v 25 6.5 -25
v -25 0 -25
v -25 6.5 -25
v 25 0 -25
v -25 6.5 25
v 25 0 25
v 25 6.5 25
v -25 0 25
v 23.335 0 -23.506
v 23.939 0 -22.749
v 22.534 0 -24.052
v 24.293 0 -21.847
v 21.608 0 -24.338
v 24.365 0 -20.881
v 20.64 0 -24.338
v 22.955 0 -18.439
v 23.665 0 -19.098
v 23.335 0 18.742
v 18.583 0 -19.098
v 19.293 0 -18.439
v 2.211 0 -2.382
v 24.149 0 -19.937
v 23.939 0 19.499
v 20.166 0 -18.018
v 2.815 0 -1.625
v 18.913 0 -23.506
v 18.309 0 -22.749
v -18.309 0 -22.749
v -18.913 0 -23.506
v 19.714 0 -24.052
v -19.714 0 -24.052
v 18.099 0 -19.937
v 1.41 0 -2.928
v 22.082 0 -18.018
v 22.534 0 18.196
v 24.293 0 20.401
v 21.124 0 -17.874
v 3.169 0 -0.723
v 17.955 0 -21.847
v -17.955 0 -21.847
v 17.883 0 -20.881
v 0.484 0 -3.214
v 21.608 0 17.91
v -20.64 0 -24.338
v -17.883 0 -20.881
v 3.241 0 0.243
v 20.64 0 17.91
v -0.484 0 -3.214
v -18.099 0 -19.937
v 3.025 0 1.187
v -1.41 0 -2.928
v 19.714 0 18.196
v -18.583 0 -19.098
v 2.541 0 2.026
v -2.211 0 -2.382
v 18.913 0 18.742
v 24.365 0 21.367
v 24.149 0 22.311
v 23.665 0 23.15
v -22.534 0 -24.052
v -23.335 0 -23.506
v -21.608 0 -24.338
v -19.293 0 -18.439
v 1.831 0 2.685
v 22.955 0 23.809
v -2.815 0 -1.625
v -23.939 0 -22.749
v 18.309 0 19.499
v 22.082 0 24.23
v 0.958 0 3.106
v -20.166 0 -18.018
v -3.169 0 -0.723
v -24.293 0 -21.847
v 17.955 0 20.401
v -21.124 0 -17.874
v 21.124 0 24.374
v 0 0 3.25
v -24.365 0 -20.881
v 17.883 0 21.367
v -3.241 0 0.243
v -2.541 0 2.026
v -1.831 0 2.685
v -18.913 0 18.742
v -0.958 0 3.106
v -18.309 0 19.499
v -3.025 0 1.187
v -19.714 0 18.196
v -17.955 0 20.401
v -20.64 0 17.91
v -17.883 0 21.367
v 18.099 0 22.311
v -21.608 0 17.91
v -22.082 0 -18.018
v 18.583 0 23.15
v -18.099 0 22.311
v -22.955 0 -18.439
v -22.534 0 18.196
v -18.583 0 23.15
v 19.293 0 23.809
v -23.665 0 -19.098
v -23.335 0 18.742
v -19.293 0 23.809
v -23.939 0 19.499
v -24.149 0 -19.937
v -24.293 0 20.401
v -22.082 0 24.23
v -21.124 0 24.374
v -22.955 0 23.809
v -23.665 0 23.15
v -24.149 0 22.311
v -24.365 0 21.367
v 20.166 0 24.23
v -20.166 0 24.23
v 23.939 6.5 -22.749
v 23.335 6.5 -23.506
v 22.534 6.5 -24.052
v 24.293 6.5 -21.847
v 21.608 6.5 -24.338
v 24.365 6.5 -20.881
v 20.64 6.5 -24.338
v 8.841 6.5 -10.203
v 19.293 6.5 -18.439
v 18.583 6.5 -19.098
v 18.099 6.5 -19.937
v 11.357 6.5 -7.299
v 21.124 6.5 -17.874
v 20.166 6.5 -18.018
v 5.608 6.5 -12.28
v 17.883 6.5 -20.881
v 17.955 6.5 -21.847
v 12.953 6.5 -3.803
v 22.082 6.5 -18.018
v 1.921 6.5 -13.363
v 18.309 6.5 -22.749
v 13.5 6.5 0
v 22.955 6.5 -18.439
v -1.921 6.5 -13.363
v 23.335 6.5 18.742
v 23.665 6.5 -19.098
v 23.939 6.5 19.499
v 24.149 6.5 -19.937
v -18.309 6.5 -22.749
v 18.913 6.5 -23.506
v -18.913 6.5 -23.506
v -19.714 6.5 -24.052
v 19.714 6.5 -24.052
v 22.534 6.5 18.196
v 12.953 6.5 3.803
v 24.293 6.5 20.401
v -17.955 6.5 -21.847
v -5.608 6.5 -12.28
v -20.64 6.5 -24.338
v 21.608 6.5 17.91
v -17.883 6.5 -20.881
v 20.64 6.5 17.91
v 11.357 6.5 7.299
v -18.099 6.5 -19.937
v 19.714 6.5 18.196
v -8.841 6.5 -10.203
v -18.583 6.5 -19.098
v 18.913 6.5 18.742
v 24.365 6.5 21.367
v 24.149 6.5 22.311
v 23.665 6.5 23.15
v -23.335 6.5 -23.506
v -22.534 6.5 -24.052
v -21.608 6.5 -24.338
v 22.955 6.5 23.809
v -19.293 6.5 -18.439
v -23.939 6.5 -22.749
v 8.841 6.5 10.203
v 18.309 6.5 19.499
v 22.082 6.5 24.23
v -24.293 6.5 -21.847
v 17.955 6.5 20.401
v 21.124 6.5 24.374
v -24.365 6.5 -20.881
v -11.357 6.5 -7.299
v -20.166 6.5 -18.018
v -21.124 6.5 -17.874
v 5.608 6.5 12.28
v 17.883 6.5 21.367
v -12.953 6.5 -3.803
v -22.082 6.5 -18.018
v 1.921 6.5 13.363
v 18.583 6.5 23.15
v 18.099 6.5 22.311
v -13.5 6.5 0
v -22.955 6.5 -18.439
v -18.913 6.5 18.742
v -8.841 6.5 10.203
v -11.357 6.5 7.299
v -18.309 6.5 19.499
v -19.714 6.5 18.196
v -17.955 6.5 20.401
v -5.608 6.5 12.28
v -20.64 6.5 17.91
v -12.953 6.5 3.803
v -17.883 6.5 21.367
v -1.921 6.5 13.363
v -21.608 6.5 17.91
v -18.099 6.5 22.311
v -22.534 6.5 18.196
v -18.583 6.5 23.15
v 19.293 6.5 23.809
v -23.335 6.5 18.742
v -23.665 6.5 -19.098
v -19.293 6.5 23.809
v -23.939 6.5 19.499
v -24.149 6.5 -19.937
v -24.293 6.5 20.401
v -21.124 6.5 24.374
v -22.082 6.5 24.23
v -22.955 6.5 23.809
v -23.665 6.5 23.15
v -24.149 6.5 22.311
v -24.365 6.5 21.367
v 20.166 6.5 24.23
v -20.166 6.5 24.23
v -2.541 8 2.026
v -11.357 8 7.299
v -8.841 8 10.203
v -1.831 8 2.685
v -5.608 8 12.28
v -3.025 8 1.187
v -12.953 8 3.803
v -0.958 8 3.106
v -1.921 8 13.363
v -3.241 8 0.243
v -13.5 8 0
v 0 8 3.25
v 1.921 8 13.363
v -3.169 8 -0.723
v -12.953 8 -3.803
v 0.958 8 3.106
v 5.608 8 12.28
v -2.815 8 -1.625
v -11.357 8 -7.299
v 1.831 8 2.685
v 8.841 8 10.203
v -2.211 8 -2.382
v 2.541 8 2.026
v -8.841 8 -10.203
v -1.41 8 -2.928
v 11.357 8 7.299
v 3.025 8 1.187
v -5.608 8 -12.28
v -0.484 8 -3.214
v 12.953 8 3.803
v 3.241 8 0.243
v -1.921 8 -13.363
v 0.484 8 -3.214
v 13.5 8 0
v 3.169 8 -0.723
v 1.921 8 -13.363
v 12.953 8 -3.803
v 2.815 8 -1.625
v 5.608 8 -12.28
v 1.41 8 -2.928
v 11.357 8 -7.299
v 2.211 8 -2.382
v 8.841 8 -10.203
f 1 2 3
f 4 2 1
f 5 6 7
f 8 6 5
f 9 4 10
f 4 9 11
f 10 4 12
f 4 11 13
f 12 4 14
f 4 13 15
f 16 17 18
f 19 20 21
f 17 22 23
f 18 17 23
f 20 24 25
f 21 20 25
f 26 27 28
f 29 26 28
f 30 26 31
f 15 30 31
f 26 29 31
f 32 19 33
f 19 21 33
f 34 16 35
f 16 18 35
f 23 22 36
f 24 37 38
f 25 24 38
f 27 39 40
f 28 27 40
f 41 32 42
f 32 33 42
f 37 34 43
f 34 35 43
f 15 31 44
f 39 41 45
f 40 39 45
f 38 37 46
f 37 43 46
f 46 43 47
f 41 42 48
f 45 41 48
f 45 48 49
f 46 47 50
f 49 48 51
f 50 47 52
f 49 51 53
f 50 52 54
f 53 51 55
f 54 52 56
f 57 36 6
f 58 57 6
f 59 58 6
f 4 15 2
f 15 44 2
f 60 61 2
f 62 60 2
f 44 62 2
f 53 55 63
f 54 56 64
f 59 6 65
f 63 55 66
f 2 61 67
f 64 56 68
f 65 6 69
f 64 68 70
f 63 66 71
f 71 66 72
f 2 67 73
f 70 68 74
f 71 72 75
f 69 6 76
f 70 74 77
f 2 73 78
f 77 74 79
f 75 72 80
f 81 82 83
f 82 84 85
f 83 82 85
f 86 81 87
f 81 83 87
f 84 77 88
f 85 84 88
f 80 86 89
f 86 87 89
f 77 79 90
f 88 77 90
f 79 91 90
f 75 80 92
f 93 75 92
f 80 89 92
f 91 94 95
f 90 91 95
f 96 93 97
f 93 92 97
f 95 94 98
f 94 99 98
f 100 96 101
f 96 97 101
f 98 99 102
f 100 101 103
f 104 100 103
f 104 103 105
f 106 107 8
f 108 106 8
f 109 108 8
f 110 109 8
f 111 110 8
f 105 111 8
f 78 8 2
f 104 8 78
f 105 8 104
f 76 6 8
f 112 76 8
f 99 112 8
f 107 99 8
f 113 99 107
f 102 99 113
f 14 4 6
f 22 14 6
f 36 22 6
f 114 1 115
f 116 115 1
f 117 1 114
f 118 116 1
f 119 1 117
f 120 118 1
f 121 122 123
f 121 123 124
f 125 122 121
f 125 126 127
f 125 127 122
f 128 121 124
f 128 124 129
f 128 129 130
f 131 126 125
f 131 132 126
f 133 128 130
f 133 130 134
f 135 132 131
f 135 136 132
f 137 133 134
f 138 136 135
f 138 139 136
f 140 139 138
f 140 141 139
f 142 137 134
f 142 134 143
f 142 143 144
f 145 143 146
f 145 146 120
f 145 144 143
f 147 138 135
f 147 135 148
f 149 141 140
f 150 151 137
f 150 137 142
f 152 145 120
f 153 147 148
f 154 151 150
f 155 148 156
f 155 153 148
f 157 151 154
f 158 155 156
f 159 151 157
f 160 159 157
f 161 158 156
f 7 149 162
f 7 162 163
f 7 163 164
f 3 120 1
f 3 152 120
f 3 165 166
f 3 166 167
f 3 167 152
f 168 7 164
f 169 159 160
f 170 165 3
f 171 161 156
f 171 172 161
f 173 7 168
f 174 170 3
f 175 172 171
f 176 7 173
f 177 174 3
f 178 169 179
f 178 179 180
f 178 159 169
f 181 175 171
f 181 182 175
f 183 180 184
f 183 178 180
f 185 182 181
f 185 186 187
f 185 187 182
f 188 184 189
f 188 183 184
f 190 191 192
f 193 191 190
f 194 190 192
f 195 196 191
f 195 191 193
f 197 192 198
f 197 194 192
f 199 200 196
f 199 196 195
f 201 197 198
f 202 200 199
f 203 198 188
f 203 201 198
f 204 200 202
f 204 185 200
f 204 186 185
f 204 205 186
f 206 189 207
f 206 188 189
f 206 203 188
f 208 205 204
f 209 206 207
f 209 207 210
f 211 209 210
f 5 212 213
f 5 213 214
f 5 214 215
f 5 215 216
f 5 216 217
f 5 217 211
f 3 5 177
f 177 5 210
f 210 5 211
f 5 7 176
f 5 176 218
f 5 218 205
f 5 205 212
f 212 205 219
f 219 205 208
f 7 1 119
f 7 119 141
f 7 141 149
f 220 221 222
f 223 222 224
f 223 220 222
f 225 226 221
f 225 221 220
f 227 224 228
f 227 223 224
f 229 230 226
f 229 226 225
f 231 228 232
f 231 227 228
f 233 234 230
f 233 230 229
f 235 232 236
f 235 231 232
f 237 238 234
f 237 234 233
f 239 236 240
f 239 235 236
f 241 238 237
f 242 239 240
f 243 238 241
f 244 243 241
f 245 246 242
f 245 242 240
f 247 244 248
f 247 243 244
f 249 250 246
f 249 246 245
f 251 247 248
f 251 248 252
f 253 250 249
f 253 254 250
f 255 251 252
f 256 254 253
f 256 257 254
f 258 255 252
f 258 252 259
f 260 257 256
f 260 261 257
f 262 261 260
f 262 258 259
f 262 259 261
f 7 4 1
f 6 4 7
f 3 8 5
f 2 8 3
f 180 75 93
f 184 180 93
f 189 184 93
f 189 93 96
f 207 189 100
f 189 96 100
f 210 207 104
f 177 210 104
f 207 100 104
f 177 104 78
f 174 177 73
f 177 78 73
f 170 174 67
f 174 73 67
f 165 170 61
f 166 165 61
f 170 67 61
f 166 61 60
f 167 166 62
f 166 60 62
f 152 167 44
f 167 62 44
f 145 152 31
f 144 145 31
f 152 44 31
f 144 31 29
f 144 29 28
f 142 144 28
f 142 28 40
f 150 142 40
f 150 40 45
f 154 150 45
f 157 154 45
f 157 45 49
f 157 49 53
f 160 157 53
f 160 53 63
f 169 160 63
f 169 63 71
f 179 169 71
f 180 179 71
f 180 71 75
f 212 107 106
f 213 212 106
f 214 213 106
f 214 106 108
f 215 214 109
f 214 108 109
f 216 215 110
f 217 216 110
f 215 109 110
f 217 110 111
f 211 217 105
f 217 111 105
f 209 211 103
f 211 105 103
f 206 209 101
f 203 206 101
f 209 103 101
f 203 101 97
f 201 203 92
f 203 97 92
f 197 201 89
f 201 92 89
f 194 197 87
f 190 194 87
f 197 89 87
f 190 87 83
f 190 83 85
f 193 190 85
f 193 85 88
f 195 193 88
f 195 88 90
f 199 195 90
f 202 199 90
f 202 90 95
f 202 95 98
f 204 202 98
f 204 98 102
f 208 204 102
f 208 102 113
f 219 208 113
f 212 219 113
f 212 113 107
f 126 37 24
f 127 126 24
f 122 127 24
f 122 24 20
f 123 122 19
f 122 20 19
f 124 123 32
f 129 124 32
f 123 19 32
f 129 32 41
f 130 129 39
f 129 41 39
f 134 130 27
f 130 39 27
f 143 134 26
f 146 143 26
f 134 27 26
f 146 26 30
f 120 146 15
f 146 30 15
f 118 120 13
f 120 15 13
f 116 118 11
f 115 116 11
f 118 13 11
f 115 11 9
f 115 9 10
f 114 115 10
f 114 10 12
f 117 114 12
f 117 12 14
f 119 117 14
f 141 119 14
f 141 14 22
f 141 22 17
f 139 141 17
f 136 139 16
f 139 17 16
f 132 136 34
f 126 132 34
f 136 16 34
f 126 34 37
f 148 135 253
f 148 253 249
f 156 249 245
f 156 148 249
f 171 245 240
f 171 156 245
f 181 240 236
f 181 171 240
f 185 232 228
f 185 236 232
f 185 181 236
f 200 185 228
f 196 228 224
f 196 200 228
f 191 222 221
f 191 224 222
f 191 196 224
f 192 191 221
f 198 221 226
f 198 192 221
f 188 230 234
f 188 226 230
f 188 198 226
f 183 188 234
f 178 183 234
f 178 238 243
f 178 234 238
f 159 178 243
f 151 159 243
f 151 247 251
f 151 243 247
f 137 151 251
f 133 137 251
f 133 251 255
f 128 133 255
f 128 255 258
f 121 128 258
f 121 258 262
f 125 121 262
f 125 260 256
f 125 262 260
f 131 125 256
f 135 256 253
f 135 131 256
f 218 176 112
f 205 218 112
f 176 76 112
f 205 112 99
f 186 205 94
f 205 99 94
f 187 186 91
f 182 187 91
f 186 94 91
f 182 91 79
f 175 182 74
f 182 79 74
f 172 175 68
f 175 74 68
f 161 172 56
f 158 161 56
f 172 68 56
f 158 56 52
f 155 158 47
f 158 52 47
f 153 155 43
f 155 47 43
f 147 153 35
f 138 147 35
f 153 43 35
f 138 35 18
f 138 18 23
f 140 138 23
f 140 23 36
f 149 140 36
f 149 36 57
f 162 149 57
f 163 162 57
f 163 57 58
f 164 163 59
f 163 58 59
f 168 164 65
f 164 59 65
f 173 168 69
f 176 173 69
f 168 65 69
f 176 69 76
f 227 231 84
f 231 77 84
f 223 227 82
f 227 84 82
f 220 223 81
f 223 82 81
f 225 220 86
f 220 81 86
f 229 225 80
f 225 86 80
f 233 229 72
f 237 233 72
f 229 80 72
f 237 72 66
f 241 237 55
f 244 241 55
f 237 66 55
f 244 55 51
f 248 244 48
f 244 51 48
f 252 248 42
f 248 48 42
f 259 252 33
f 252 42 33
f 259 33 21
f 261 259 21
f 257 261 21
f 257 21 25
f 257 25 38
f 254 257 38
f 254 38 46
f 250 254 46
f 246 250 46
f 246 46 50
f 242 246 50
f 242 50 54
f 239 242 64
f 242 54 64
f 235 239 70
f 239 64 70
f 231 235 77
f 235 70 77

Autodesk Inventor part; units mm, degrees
ref_plane "YZ Plane" through (0, 0, 0) normal (1, 0, 0) x (0, 1, 0)
ref_plane "XZ Plane" through (0, 0, 0) normal (0, 1, 0) x (-1, 0, 0)
ref_plane "XY Plane" through (0, 0, 0) normal (0, 0, 1) x (1, 0, 0)
sketch "Skizze1" plane through (0, 0, 0) normal (0, 1, 0) x (-1, 0, 0)
  line L0 (-25, 25) -> (25, 25)
  line L1 (25, 25) -> (25, -25)
  line L2 (25, -25) -> (-25, -25)
  line L3 (-25, -25) -> (-25, 25)
  line L4 (-25, 25) -> (25, -25) construction
  line L5 (25, 25) -> (-25, -25) construction
  point P0 (0, 0)
  dimension "d0" = 50
  dimension "d1" = 50
extrude "Extrusion1" add sketch "Skizze1" along normal blind 6.5
sketch "Skizze2" plane through (0, 6.5, 0) normal (0, 1, 0) x (1, 0, 0)
  circle A0 centre (0, 0) radius 13.5
  dimension "d4" = 27
extrude "Extrusion2" add sketch "Skizze2" along normal blind 1.5
sketch "Skizze3" plane through (0, 8, 0) normal (0, 1, 0) x (1, 0, 0)
  circle A0 centre (0, 0) radius 13.5 projected
hole "Bohrung1" at (0, 8, 0) direction (0, -1, 0) diameter 6.5 depth 8
sketch "Skizze4" plane through (0, 6.5, 0) normal (0, 1, 0) x (1, 0, 0)
  line L0 (25, -25) -> (25, 25) projected
  line L1 (25, 0) -> (-25, 0) construction
  line L2 (-25, 25) -> (-25, -25) projected
  line L3 (-25, -25) -> (25, -25) projected
  line L4 (0, -25) -> (0, 25) construction
  line L5 (25, 25) -> (-25, 25) projected
  point P0 (0, 0)
  point P1 (-21.124, 21.124)
  point P2 (-21.124, -21.124)
  point P3 (21.124, -21.124)
  point P4 (21.124, 21.124)
  dimension "d29" = 42.248
hole "Bohrung2" at (-21.124, 6.5, -21.124) at (-21.124, 6.5, 21.124) at (21.124, 6.5, 21.124) at (21.124, 6.5, -21.124) direction (0, -1, 0) diameter 6.5 depth 6.5
properties part number "cylinder_lid" material "Bronze, Guss"
